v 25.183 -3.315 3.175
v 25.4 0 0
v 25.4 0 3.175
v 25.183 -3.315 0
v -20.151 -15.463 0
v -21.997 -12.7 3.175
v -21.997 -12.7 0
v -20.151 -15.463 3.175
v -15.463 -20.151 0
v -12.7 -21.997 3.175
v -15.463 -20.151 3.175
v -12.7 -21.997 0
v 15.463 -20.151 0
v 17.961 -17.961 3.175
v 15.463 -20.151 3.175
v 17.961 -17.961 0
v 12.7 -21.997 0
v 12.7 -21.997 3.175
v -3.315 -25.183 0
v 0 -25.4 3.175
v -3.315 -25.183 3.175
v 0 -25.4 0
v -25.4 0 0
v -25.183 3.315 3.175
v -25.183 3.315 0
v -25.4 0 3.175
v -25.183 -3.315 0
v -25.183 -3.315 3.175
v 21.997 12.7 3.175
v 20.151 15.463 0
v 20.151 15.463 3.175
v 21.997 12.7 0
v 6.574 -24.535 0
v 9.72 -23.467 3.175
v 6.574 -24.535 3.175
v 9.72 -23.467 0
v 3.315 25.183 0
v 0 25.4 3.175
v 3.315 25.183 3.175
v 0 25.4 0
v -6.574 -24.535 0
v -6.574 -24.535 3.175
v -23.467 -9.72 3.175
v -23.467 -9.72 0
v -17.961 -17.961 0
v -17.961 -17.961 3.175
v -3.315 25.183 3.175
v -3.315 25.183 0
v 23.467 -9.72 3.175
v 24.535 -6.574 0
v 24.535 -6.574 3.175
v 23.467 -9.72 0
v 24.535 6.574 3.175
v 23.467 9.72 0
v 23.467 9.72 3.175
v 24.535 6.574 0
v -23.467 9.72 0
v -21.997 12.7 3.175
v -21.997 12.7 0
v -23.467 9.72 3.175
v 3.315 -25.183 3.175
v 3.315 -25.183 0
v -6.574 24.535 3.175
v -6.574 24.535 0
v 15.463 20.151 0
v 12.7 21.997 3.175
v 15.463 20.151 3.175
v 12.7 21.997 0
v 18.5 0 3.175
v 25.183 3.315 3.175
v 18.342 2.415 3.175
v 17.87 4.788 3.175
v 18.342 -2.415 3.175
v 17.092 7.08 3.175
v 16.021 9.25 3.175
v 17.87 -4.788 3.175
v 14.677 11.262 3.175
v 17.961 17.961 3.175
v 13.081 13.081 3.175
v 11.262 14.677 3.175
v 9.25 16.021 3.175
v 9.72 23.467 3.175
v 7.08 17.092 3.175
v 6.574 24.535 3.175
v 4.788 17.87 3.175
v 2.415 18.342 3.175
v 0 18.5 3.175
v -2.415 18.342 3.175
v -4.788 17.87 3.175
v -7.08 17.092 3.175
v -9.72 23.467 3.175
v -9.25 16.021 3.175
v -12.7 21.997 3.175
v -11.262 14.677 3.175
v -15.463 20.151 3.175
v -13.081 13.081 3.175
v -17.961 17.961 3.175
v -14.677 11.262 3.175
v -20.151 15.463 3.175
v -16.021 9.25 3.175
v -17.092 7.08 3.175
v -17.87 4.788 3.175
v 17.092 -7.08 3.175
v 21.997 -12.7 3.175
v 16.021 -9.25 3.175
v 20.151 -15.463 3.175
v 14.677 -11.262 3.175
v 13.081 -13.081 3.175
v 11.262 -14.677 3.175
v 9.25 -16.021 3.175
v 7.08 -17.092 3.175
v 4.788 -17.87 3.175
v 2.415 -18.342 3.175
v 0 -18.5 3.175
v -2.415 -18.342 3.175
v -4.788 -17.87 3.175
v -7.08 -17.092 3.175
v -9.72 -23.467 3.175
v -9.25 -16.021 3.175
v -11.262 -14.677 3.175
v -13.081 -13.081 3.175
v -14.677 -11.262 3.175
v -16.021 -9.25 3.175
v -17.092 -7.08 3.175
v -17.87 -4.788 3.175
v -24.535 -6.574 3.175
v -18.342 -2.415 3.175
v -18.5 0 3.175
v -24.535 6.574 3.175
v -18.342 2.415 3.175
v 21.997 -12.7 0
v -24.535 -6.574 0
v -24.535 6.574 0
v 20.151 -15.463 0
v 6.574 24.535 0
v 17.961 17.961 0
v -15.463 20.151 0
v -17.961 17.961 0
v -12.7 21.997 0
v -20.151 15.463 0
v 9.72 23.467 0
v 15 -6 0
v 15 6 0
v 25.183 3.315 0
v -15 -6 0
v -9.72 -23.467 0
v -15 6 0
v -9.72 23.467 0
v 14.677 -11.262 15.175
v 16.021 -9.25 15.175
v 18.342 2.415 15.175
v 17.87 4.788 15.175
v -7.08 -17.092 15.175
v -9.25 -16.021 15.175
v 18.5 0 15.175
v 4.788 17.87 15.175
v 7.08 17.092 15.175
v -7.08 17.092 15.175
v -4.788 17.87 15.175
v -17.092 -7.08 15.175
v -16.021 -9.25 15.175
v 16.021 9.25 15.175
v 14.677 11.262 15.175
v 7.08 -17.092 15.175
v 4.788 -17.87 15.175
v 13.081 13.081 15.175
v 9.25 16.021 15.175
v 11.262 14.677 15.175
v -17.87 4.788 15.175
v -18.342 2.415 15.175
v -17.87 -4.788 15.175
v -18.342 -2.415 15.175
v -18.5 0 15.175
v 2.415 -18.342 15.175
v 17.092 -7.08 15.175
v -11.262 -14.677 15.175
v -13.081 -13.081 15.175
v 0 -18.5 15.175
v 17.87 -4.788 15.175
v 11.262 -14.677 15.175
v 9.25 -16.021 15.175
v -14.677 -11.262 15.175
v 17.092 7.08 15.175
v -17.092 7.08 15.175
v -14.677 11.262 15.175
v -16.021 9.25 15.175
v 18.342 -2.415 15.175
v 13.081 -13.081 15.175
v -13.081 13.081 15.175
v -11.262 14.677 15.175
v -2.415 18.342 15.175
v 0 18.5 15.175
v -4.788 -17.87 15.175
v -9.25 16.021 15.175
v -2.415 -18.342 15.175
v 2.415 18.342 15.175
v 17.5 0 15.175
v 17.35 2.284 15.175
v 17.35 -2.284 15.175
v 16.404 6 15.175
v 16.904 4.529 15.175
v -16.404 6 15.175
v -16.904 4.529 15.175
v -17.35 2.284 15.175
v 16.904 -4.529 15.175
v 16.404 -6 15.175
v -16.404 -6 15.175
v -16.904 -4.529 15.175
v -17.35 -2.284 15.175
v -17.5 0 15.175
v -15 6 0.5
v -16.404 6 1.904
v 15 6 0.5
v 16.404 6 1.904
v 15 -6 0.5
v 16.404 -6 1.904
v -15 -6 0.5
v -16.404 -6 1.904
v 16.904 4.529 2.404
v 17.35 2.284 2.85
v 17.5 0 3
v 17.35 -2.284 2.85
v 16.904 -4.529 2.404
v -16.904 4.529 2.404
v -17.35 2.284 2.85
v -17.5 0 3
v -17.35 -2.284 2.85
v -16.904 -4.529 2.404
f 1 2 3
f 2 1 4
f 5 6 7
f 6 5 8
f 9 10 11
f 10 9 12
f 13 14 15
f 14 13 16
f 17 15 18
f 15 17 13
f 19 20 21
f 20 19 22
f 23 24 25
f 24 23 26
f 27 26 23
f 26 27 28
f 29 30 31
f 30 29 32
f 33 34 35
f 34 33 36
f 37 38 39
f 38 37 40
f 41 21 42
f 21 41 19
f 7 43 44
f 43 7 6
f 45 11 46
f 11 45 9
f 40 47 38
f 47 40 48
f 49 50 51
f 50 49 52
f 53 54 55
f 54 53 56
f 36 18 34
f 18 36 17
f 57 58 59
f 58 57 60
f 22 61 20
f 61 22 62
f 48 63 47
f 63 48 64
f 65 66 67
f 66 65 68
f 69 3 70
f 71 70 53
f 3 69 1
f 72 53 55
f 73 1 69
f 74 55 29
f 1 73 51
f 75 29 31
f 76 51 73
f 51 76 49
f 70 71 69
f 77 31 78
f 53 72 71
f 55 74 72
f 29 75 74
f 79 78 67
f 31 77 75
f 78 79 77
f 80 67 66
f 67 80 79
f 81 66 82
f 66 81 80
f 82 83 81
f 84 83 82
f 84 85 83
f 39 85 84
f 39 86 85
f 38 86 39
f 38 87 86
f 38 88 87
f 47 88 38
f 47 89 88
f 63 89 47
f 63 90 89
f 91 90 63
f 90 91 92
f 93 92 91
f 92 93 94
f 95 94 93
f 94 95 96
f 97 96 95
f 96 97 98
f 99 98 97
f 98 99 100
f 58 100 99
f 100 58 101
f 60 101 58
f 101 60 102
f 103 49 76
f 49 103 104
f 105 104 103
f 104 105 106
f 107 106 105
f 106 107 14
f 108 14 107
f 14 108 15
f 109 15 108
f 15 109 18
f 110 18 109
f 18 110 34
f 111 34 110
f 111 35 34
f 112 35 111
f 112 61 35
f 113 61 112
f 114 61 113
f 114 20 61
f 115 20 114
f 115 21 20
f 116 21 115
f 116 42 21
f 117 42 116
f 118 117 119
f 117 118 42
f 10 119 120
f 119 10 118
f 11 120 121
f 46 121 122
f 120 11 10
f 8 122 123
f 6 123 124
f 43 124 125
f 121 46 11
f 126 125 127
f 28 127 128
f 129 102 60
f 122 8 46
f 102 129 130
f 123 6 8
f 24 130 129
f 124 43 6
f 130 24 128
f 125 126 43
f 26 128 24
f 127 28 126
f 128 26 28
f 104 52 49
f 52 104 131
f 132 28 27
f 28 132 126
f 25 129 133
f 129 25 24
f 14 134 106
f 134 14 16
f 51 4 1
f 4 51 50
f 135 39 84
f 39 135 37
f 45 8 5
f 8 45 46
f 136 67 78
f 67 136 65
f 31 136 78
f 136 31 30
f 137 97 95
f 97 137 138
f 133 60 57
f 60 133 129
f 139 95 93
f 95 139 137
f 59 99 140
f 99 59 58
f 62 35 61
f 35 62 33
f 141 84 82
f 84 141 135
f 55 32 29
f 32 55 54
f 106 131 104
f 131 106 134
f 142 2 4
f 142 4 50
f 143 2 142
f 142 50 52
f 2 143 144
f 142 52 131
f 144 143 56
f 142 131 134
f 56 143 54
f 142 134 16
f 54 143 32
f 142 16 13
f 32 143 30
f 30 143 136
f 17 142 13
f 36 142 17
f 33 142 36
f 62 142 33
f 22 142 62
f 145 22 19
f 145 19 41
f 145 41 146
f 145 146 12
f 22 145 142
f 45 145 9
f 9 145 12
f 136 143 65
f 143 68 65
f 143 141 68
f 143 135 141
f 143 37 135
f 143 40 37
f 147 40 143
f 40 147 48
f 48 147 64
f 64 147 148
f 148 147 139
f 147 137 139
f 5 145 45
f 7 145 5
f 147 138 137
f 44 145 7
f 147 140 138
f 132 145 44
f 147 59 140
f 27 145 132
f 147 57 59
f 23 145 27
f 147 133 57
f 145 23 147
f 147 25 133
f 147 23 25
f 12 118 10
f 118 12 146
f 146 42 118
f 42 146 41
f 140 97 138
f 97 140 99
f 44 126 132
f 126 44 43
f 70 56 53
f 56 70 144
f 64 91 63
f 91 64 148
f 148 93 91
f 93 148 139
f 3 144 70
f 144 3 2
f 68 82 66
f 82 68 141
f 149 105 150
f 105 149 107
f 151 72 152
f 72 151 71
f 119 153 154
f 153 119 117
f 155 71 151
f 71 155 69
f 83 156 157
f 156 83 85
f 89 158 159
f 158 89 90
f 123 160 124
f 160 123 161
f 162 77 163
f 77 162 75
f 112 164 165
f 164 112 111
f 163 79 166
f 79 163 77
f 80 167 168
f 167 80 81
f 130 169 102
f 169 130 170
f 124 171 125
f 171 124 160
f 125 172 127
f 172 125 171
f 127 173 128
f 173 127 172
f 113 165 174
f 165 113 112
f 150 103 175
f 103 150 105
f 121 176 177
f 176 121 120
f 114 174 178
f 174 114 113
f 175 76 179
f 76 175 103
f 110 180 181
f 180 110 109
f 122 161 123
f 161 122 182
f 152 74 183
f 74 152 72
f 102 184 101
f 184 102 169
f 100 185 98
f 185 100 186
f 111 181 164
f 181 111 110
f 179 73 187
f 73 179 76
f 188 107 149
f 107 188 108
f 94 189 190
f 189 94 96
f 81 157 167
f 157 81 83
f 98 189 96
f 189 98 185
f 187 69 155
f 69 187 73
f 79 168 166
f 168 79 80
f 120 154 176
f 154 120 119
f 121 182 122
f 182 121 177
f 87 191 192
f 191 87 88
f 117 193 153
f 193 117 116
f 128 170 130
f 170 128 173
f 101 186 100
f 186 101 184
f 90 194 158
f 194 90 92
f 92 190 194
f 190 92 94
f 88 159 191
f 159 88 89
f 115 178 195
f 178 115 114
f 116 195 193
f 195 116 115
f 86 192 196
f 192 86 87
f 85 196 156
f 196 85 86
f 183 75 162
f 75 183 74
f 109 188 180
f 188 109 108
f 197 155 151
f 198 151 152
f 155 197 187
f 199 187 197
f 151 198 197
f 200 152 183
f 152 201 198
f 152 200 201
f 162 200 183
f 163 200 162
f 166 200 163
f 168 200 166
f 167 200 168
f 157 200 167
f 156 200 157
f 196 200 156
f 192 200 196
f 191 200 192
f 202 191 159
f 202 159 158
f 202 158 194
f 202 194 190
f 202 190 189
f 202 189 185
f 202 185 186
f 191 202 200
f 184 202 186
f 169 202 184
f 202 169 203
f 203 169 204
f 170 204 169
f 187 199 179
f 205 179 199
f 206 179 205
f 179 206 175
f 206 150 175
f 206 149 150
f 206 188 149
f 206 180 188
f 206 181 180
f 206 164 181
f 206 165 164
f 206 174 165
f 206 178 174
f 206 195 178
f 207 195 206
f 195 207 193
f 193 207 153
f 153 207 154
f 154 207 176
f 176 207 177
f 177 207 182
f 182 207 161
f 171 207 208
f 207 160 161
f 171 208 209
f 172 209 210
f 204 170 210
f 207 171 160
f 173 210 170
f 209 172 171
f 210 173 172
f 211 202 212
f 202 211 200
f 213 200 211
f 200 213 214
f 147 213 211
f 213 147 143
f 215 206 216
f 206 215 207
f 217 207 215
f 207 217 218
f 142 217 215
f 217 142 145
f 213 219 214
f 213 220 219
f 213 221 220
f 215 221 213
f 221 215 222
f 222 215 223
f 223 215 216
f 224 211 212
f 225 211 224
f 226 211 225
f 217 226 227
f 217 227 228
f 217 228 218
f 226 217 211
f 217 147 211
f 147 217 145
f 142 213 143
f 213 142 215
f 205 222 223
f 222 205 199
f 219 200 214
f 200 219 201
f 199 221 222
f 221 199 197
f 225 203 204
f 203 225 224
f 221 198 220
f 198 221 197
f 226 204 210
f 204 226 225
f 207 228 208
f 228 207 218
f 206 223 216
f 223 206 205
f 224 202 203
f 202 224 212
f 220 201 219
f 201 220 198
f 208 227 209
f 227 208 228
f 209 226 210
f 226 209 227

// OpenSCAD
// file: ../lib/TOGHoleLib-v1.scad
// TOGHoleLib-v1.4
//
// Library of hole shapes!
// Mostly to accommodate counterbored/countersunk screws.
//
// Changes:
// v1.1:
// - Reduced #6 counterunk holes from 8, 4, 2, 5 to  7.5, 3.5, 1.7, 4.5
//   WSITEM-200448 was the first print to use this new, smaller size,
//   and it seems just about perfect, at least as far as the flat top
//   sitting just barely below the surface
// v1.2:
// - Add 'none' hole style, which does nothing
// v1.3:
// - Add 'tog_holelib_get_hole_types()' and `tog_holelib_is_hole_type(name)` functions
// v1.4:
// - Add THL-1013, a hole for the CRE24F2HBBNE SPDT rocker switches I got from DigiKey years ago

module tog_holelib_countersunk_hole_2(surface_d, neck_d, head_h, depth, bore_d, overhead_bore_d, overhead_bore_height) {
	rotate_extrude() {
		union() {
			// Bore
			polygon([
				[     0  , -depth],
				[bore_d/2, -depth],
				[bore_d/2, -0.01],
				[     0  , -0.01],
			]);
			// Head and headbore
			polygon([
				[              0  ,               -head_h],
				[         neck_d/2,               -head_h],
				// Try to avoid points exactly at the surface:
				[      surface_d/2,                 0.01 ],
				[overhead_bore_d/2,                 0.01 ],
				[overhead_bore_d/2,  overhead_bore_height],
				[              0  ,  overhead_bore_height],
			]);
		}
	}
}

module tog_holelib_countersunk_hole(surface_d, neck_d, head_h, depth, bore_d=-1, overhead_bore_d=0, overhead_bore_height=1) {
	tog_holelib_countersunk_hole_2(surface_d, neck_d, head_h, depth, bore_d == -1 ? neck_d : bore_d, max(surface_d, overhead_bore_d), overhead_bore_height);
}

// Suitable for #6 flatheads
module tog_holelib_hole1001(depth, overhead_bore_height=1) {
	tog_holelib_countersunk_hole(7.5, 3.5, 1.7, depth, 4.5, 0, overhead_bore_height);
}

// Suitable for 1/4" flatheads
module tog_holelib_hole1002(depth, overhead_bore_height=1) {
	inch = 25.4;
	tog_holelib_countersunk_hole(1/2*inch, 1/4*inch, 1/8*inch, depth, 5/16*inch, 0, overhead_bore_height);
}

// Suitable for the 3-way switches I got from DigiKey years ago:
// https://www.digikey.com/en/products/detail/zf-electronics/CRE24F2HBBNE/446073
// (Manufacturer part number: CRE24F2HBBNE, DigiKey part number: CH807-ND)
module tog_holelib_hole1013(
	depth, overhead_bore_height=1,
	hole_length    = 30,
	hole_width     = 12,
	shaft_inner_diameter = 35,
) intersection() {
	// Some hardcoded values:
	shaft_diameter = shaft_inner_diameter+2;

	bevel_length = (shaft_diameter-hole_length)/2;
	bevel_start_z = 0.5;
	
	rotate([-90,0,0]) linear_extrude(hole_width, center=true) polygon([
		[-hole_length/2               ,                           -1],
		[-hole_length/2               , bevel_start_z               ],
		[-hole_length/2 - bevel_length, bevel_start_z + bevel_length],
		[-hole_length/2 - bevel_length,                        depth],
		[+hole_length/2 + bevel_length,                        depth],
		[+hole_length/2 + bevel_length, bevel_start_z + bevel_length],
		[+hole_length/2               , bevel_start_z               ],
		[+hole_length/2               ,                           -1]
	]);

	translate([0,0,-depth-1]) linear_extrude(depth+overhead_bore_height+2) circle(d=shaft_inner_diameter);	
}

tog_holelib_hole_types = [
	["THL-1001", "Suitable for #6 flathead"],
	["THL-1002", "Suitable for 1/4\" flathead"],
	["THL-1013", "Suitable for CRE24F2HBBNE SPDT rocker switche"],
];

function tog_holelib_get_hole_types() = tog_holelib_hole_types;

function tog_holelib_is_hole_type(type_name, idx=0) =
	idx > len(tog_holelib_hole_types) ? false :
	tog_holelib_hole_types[idx][0] == type_name ? true :
	tog_holelib_is_hole_type(type_name, idx=idx + 1);

module tog_holelib_hole(type_name, depth=1000, overhead_bore_height=1) {
	if( type_name == "none" ) {
		// Here so callers don't need to make a special case for it
	} else if( type_name == "THL-1001" ) {
		tog_holelib_hole1001(depth, overhead_bore_height);
	} else if( type_name == "THL-1002" ) {
		tog_holelib_hole1002(depth, overhead_bore_height);
	} else if( type_name == "THL-1013" ) {
		tog_holelib_hole1013(depth, overhead_bore_height);
	} else {
		assert(false, str("Unknown hole type: '", type_name, "'"));
	}
}
// main file
// 3WaySwitchPlug-v1.3.3
// 
// Adapter so that the 3-way (a-b c, a b-c, a b c) switches I bought from DigiKey years ago
// (TODO: link might be nice) can be put into a round hole.
// 
// Dimensions of the switch:
// Flange : 31.7mm x 16.4mm (long dimension is about 1+1/4")
// Shaft  : 30.7mm x 12.0mm (clips maximally squshed by my calipers)
// Shaft extends 18.3mm down, and contacts extend 28.3mm below the bottom of the flange
//
// Changes:
// v1.1:
// - Make hole length/width configurable
// v1.2:
// - Make all dimensions configurable in 0.1mm increments
// v1.3.0:
// - Shaft hole width = hole_width
// - Add 'snap-test' mode
// v1.3.1:
// - 'beveled' hole style
// - Smaller hole (29mm x 12mm)
// v1.3.2:
// - Default hole length = 30mm
// v1.3.3:
// - Copy hole shape to TOGHoleLib, use that as default implementation,
//   keeping `hole_style = "beveled-original"` for reference

diagonal = 33;

flange_thickness = 3.175;  // 0.1
flange_diameter  = 50.8;   // 0.1
shaft_length     = 12;     // 0.1
shaft_diameter   = 37;     // 0.1
shaft_inner_diameter = 35; // 0.1

// Tabs can be squeezed down to 29.1 or so with force, probably smaller; solid part is about 25mm
hole_length = 30; // 0.1
hole_width  = 12; // 0.1

mode = "full"; // ["full","snap-test"]
hole_style = "beveled"; // ["beveled","beveled-original","square"]

$fn = 48;

use <../lib/TOGHoleLib-v1.scad>

module panel_hole() {
	square([hole_length, hole_width], center=true);
}
module shaft_hole() {
	square([shaft_diameter, hole_width], center=true);
}

total_height = flange_thickness+shaft_length;

module the_hole(hole_style="beveled", depth=flange_thickness+shaft_length+1) intersection() {
	if( hole_style == "square" ) {
		linear_extrude(total_height*3, center=true) panel_hole();
		translate([0,0,flange_thickness-0.01]) linear_extrude(total_height) shaft_hole();
	} else {
		bevel_length = (shaft_diameter-hole_length)/2;
		bevel_start_z = 0.5;
		rotate([-90,0,0]) linear_extrude(hole_width, center=true) polygon([
			[-hole_length/2               ,                           -1],
			[-hole_length/2               , bevel_start_z               ],
			[-hole_length/2 - bevel_length, bevel_start_z + bevel_length],
			[-hole_length/2 - bevel_length,                        depth],
			[+hole_length/2 + bevel_length,                        depth],
			[+hole_length/2 + bevel_length, bevel_start_z + bevel_length],
			[+hole_length/2               , bevel_start_z               ],
			[+hole_length/2               ,                           -1]
		]);
	}

	linear_extrude(total_height*3, center=true) circle(d=shaft_inner_diameter);	
}

difference() {
	if( mode == "full" ) union() {
		epsilon = flange_thickness/2;
		if(flange_thickness > 0) linear_extrude(flange_thickness) circle(d=flange_diameter);
		translate([0,0,flange_thickness-epsilon]) linear_extrude(shaft_length+epsilon) difference() {
			circle(d=shaft_diameter);
			// circle(d=shaft_inner_diameter);
		}
	} else if( mode == "snap-test" ) {
		linear_extrude(flange_thickness+2) intersection() {
			square([shaft_diameter+2,hole_width+2], center=true);
			circle(d=shaft_diameter);
		}
	}

	rotate([180,0,0]) if( hole_style == "square" || hole_style == "beveled-original" ) {
		the_hole(hole_style=hole_style);
	} else {
		tog_holelib_hole("THL-1013", depth=flange_thickness+shaft_length+1);
	}
}
